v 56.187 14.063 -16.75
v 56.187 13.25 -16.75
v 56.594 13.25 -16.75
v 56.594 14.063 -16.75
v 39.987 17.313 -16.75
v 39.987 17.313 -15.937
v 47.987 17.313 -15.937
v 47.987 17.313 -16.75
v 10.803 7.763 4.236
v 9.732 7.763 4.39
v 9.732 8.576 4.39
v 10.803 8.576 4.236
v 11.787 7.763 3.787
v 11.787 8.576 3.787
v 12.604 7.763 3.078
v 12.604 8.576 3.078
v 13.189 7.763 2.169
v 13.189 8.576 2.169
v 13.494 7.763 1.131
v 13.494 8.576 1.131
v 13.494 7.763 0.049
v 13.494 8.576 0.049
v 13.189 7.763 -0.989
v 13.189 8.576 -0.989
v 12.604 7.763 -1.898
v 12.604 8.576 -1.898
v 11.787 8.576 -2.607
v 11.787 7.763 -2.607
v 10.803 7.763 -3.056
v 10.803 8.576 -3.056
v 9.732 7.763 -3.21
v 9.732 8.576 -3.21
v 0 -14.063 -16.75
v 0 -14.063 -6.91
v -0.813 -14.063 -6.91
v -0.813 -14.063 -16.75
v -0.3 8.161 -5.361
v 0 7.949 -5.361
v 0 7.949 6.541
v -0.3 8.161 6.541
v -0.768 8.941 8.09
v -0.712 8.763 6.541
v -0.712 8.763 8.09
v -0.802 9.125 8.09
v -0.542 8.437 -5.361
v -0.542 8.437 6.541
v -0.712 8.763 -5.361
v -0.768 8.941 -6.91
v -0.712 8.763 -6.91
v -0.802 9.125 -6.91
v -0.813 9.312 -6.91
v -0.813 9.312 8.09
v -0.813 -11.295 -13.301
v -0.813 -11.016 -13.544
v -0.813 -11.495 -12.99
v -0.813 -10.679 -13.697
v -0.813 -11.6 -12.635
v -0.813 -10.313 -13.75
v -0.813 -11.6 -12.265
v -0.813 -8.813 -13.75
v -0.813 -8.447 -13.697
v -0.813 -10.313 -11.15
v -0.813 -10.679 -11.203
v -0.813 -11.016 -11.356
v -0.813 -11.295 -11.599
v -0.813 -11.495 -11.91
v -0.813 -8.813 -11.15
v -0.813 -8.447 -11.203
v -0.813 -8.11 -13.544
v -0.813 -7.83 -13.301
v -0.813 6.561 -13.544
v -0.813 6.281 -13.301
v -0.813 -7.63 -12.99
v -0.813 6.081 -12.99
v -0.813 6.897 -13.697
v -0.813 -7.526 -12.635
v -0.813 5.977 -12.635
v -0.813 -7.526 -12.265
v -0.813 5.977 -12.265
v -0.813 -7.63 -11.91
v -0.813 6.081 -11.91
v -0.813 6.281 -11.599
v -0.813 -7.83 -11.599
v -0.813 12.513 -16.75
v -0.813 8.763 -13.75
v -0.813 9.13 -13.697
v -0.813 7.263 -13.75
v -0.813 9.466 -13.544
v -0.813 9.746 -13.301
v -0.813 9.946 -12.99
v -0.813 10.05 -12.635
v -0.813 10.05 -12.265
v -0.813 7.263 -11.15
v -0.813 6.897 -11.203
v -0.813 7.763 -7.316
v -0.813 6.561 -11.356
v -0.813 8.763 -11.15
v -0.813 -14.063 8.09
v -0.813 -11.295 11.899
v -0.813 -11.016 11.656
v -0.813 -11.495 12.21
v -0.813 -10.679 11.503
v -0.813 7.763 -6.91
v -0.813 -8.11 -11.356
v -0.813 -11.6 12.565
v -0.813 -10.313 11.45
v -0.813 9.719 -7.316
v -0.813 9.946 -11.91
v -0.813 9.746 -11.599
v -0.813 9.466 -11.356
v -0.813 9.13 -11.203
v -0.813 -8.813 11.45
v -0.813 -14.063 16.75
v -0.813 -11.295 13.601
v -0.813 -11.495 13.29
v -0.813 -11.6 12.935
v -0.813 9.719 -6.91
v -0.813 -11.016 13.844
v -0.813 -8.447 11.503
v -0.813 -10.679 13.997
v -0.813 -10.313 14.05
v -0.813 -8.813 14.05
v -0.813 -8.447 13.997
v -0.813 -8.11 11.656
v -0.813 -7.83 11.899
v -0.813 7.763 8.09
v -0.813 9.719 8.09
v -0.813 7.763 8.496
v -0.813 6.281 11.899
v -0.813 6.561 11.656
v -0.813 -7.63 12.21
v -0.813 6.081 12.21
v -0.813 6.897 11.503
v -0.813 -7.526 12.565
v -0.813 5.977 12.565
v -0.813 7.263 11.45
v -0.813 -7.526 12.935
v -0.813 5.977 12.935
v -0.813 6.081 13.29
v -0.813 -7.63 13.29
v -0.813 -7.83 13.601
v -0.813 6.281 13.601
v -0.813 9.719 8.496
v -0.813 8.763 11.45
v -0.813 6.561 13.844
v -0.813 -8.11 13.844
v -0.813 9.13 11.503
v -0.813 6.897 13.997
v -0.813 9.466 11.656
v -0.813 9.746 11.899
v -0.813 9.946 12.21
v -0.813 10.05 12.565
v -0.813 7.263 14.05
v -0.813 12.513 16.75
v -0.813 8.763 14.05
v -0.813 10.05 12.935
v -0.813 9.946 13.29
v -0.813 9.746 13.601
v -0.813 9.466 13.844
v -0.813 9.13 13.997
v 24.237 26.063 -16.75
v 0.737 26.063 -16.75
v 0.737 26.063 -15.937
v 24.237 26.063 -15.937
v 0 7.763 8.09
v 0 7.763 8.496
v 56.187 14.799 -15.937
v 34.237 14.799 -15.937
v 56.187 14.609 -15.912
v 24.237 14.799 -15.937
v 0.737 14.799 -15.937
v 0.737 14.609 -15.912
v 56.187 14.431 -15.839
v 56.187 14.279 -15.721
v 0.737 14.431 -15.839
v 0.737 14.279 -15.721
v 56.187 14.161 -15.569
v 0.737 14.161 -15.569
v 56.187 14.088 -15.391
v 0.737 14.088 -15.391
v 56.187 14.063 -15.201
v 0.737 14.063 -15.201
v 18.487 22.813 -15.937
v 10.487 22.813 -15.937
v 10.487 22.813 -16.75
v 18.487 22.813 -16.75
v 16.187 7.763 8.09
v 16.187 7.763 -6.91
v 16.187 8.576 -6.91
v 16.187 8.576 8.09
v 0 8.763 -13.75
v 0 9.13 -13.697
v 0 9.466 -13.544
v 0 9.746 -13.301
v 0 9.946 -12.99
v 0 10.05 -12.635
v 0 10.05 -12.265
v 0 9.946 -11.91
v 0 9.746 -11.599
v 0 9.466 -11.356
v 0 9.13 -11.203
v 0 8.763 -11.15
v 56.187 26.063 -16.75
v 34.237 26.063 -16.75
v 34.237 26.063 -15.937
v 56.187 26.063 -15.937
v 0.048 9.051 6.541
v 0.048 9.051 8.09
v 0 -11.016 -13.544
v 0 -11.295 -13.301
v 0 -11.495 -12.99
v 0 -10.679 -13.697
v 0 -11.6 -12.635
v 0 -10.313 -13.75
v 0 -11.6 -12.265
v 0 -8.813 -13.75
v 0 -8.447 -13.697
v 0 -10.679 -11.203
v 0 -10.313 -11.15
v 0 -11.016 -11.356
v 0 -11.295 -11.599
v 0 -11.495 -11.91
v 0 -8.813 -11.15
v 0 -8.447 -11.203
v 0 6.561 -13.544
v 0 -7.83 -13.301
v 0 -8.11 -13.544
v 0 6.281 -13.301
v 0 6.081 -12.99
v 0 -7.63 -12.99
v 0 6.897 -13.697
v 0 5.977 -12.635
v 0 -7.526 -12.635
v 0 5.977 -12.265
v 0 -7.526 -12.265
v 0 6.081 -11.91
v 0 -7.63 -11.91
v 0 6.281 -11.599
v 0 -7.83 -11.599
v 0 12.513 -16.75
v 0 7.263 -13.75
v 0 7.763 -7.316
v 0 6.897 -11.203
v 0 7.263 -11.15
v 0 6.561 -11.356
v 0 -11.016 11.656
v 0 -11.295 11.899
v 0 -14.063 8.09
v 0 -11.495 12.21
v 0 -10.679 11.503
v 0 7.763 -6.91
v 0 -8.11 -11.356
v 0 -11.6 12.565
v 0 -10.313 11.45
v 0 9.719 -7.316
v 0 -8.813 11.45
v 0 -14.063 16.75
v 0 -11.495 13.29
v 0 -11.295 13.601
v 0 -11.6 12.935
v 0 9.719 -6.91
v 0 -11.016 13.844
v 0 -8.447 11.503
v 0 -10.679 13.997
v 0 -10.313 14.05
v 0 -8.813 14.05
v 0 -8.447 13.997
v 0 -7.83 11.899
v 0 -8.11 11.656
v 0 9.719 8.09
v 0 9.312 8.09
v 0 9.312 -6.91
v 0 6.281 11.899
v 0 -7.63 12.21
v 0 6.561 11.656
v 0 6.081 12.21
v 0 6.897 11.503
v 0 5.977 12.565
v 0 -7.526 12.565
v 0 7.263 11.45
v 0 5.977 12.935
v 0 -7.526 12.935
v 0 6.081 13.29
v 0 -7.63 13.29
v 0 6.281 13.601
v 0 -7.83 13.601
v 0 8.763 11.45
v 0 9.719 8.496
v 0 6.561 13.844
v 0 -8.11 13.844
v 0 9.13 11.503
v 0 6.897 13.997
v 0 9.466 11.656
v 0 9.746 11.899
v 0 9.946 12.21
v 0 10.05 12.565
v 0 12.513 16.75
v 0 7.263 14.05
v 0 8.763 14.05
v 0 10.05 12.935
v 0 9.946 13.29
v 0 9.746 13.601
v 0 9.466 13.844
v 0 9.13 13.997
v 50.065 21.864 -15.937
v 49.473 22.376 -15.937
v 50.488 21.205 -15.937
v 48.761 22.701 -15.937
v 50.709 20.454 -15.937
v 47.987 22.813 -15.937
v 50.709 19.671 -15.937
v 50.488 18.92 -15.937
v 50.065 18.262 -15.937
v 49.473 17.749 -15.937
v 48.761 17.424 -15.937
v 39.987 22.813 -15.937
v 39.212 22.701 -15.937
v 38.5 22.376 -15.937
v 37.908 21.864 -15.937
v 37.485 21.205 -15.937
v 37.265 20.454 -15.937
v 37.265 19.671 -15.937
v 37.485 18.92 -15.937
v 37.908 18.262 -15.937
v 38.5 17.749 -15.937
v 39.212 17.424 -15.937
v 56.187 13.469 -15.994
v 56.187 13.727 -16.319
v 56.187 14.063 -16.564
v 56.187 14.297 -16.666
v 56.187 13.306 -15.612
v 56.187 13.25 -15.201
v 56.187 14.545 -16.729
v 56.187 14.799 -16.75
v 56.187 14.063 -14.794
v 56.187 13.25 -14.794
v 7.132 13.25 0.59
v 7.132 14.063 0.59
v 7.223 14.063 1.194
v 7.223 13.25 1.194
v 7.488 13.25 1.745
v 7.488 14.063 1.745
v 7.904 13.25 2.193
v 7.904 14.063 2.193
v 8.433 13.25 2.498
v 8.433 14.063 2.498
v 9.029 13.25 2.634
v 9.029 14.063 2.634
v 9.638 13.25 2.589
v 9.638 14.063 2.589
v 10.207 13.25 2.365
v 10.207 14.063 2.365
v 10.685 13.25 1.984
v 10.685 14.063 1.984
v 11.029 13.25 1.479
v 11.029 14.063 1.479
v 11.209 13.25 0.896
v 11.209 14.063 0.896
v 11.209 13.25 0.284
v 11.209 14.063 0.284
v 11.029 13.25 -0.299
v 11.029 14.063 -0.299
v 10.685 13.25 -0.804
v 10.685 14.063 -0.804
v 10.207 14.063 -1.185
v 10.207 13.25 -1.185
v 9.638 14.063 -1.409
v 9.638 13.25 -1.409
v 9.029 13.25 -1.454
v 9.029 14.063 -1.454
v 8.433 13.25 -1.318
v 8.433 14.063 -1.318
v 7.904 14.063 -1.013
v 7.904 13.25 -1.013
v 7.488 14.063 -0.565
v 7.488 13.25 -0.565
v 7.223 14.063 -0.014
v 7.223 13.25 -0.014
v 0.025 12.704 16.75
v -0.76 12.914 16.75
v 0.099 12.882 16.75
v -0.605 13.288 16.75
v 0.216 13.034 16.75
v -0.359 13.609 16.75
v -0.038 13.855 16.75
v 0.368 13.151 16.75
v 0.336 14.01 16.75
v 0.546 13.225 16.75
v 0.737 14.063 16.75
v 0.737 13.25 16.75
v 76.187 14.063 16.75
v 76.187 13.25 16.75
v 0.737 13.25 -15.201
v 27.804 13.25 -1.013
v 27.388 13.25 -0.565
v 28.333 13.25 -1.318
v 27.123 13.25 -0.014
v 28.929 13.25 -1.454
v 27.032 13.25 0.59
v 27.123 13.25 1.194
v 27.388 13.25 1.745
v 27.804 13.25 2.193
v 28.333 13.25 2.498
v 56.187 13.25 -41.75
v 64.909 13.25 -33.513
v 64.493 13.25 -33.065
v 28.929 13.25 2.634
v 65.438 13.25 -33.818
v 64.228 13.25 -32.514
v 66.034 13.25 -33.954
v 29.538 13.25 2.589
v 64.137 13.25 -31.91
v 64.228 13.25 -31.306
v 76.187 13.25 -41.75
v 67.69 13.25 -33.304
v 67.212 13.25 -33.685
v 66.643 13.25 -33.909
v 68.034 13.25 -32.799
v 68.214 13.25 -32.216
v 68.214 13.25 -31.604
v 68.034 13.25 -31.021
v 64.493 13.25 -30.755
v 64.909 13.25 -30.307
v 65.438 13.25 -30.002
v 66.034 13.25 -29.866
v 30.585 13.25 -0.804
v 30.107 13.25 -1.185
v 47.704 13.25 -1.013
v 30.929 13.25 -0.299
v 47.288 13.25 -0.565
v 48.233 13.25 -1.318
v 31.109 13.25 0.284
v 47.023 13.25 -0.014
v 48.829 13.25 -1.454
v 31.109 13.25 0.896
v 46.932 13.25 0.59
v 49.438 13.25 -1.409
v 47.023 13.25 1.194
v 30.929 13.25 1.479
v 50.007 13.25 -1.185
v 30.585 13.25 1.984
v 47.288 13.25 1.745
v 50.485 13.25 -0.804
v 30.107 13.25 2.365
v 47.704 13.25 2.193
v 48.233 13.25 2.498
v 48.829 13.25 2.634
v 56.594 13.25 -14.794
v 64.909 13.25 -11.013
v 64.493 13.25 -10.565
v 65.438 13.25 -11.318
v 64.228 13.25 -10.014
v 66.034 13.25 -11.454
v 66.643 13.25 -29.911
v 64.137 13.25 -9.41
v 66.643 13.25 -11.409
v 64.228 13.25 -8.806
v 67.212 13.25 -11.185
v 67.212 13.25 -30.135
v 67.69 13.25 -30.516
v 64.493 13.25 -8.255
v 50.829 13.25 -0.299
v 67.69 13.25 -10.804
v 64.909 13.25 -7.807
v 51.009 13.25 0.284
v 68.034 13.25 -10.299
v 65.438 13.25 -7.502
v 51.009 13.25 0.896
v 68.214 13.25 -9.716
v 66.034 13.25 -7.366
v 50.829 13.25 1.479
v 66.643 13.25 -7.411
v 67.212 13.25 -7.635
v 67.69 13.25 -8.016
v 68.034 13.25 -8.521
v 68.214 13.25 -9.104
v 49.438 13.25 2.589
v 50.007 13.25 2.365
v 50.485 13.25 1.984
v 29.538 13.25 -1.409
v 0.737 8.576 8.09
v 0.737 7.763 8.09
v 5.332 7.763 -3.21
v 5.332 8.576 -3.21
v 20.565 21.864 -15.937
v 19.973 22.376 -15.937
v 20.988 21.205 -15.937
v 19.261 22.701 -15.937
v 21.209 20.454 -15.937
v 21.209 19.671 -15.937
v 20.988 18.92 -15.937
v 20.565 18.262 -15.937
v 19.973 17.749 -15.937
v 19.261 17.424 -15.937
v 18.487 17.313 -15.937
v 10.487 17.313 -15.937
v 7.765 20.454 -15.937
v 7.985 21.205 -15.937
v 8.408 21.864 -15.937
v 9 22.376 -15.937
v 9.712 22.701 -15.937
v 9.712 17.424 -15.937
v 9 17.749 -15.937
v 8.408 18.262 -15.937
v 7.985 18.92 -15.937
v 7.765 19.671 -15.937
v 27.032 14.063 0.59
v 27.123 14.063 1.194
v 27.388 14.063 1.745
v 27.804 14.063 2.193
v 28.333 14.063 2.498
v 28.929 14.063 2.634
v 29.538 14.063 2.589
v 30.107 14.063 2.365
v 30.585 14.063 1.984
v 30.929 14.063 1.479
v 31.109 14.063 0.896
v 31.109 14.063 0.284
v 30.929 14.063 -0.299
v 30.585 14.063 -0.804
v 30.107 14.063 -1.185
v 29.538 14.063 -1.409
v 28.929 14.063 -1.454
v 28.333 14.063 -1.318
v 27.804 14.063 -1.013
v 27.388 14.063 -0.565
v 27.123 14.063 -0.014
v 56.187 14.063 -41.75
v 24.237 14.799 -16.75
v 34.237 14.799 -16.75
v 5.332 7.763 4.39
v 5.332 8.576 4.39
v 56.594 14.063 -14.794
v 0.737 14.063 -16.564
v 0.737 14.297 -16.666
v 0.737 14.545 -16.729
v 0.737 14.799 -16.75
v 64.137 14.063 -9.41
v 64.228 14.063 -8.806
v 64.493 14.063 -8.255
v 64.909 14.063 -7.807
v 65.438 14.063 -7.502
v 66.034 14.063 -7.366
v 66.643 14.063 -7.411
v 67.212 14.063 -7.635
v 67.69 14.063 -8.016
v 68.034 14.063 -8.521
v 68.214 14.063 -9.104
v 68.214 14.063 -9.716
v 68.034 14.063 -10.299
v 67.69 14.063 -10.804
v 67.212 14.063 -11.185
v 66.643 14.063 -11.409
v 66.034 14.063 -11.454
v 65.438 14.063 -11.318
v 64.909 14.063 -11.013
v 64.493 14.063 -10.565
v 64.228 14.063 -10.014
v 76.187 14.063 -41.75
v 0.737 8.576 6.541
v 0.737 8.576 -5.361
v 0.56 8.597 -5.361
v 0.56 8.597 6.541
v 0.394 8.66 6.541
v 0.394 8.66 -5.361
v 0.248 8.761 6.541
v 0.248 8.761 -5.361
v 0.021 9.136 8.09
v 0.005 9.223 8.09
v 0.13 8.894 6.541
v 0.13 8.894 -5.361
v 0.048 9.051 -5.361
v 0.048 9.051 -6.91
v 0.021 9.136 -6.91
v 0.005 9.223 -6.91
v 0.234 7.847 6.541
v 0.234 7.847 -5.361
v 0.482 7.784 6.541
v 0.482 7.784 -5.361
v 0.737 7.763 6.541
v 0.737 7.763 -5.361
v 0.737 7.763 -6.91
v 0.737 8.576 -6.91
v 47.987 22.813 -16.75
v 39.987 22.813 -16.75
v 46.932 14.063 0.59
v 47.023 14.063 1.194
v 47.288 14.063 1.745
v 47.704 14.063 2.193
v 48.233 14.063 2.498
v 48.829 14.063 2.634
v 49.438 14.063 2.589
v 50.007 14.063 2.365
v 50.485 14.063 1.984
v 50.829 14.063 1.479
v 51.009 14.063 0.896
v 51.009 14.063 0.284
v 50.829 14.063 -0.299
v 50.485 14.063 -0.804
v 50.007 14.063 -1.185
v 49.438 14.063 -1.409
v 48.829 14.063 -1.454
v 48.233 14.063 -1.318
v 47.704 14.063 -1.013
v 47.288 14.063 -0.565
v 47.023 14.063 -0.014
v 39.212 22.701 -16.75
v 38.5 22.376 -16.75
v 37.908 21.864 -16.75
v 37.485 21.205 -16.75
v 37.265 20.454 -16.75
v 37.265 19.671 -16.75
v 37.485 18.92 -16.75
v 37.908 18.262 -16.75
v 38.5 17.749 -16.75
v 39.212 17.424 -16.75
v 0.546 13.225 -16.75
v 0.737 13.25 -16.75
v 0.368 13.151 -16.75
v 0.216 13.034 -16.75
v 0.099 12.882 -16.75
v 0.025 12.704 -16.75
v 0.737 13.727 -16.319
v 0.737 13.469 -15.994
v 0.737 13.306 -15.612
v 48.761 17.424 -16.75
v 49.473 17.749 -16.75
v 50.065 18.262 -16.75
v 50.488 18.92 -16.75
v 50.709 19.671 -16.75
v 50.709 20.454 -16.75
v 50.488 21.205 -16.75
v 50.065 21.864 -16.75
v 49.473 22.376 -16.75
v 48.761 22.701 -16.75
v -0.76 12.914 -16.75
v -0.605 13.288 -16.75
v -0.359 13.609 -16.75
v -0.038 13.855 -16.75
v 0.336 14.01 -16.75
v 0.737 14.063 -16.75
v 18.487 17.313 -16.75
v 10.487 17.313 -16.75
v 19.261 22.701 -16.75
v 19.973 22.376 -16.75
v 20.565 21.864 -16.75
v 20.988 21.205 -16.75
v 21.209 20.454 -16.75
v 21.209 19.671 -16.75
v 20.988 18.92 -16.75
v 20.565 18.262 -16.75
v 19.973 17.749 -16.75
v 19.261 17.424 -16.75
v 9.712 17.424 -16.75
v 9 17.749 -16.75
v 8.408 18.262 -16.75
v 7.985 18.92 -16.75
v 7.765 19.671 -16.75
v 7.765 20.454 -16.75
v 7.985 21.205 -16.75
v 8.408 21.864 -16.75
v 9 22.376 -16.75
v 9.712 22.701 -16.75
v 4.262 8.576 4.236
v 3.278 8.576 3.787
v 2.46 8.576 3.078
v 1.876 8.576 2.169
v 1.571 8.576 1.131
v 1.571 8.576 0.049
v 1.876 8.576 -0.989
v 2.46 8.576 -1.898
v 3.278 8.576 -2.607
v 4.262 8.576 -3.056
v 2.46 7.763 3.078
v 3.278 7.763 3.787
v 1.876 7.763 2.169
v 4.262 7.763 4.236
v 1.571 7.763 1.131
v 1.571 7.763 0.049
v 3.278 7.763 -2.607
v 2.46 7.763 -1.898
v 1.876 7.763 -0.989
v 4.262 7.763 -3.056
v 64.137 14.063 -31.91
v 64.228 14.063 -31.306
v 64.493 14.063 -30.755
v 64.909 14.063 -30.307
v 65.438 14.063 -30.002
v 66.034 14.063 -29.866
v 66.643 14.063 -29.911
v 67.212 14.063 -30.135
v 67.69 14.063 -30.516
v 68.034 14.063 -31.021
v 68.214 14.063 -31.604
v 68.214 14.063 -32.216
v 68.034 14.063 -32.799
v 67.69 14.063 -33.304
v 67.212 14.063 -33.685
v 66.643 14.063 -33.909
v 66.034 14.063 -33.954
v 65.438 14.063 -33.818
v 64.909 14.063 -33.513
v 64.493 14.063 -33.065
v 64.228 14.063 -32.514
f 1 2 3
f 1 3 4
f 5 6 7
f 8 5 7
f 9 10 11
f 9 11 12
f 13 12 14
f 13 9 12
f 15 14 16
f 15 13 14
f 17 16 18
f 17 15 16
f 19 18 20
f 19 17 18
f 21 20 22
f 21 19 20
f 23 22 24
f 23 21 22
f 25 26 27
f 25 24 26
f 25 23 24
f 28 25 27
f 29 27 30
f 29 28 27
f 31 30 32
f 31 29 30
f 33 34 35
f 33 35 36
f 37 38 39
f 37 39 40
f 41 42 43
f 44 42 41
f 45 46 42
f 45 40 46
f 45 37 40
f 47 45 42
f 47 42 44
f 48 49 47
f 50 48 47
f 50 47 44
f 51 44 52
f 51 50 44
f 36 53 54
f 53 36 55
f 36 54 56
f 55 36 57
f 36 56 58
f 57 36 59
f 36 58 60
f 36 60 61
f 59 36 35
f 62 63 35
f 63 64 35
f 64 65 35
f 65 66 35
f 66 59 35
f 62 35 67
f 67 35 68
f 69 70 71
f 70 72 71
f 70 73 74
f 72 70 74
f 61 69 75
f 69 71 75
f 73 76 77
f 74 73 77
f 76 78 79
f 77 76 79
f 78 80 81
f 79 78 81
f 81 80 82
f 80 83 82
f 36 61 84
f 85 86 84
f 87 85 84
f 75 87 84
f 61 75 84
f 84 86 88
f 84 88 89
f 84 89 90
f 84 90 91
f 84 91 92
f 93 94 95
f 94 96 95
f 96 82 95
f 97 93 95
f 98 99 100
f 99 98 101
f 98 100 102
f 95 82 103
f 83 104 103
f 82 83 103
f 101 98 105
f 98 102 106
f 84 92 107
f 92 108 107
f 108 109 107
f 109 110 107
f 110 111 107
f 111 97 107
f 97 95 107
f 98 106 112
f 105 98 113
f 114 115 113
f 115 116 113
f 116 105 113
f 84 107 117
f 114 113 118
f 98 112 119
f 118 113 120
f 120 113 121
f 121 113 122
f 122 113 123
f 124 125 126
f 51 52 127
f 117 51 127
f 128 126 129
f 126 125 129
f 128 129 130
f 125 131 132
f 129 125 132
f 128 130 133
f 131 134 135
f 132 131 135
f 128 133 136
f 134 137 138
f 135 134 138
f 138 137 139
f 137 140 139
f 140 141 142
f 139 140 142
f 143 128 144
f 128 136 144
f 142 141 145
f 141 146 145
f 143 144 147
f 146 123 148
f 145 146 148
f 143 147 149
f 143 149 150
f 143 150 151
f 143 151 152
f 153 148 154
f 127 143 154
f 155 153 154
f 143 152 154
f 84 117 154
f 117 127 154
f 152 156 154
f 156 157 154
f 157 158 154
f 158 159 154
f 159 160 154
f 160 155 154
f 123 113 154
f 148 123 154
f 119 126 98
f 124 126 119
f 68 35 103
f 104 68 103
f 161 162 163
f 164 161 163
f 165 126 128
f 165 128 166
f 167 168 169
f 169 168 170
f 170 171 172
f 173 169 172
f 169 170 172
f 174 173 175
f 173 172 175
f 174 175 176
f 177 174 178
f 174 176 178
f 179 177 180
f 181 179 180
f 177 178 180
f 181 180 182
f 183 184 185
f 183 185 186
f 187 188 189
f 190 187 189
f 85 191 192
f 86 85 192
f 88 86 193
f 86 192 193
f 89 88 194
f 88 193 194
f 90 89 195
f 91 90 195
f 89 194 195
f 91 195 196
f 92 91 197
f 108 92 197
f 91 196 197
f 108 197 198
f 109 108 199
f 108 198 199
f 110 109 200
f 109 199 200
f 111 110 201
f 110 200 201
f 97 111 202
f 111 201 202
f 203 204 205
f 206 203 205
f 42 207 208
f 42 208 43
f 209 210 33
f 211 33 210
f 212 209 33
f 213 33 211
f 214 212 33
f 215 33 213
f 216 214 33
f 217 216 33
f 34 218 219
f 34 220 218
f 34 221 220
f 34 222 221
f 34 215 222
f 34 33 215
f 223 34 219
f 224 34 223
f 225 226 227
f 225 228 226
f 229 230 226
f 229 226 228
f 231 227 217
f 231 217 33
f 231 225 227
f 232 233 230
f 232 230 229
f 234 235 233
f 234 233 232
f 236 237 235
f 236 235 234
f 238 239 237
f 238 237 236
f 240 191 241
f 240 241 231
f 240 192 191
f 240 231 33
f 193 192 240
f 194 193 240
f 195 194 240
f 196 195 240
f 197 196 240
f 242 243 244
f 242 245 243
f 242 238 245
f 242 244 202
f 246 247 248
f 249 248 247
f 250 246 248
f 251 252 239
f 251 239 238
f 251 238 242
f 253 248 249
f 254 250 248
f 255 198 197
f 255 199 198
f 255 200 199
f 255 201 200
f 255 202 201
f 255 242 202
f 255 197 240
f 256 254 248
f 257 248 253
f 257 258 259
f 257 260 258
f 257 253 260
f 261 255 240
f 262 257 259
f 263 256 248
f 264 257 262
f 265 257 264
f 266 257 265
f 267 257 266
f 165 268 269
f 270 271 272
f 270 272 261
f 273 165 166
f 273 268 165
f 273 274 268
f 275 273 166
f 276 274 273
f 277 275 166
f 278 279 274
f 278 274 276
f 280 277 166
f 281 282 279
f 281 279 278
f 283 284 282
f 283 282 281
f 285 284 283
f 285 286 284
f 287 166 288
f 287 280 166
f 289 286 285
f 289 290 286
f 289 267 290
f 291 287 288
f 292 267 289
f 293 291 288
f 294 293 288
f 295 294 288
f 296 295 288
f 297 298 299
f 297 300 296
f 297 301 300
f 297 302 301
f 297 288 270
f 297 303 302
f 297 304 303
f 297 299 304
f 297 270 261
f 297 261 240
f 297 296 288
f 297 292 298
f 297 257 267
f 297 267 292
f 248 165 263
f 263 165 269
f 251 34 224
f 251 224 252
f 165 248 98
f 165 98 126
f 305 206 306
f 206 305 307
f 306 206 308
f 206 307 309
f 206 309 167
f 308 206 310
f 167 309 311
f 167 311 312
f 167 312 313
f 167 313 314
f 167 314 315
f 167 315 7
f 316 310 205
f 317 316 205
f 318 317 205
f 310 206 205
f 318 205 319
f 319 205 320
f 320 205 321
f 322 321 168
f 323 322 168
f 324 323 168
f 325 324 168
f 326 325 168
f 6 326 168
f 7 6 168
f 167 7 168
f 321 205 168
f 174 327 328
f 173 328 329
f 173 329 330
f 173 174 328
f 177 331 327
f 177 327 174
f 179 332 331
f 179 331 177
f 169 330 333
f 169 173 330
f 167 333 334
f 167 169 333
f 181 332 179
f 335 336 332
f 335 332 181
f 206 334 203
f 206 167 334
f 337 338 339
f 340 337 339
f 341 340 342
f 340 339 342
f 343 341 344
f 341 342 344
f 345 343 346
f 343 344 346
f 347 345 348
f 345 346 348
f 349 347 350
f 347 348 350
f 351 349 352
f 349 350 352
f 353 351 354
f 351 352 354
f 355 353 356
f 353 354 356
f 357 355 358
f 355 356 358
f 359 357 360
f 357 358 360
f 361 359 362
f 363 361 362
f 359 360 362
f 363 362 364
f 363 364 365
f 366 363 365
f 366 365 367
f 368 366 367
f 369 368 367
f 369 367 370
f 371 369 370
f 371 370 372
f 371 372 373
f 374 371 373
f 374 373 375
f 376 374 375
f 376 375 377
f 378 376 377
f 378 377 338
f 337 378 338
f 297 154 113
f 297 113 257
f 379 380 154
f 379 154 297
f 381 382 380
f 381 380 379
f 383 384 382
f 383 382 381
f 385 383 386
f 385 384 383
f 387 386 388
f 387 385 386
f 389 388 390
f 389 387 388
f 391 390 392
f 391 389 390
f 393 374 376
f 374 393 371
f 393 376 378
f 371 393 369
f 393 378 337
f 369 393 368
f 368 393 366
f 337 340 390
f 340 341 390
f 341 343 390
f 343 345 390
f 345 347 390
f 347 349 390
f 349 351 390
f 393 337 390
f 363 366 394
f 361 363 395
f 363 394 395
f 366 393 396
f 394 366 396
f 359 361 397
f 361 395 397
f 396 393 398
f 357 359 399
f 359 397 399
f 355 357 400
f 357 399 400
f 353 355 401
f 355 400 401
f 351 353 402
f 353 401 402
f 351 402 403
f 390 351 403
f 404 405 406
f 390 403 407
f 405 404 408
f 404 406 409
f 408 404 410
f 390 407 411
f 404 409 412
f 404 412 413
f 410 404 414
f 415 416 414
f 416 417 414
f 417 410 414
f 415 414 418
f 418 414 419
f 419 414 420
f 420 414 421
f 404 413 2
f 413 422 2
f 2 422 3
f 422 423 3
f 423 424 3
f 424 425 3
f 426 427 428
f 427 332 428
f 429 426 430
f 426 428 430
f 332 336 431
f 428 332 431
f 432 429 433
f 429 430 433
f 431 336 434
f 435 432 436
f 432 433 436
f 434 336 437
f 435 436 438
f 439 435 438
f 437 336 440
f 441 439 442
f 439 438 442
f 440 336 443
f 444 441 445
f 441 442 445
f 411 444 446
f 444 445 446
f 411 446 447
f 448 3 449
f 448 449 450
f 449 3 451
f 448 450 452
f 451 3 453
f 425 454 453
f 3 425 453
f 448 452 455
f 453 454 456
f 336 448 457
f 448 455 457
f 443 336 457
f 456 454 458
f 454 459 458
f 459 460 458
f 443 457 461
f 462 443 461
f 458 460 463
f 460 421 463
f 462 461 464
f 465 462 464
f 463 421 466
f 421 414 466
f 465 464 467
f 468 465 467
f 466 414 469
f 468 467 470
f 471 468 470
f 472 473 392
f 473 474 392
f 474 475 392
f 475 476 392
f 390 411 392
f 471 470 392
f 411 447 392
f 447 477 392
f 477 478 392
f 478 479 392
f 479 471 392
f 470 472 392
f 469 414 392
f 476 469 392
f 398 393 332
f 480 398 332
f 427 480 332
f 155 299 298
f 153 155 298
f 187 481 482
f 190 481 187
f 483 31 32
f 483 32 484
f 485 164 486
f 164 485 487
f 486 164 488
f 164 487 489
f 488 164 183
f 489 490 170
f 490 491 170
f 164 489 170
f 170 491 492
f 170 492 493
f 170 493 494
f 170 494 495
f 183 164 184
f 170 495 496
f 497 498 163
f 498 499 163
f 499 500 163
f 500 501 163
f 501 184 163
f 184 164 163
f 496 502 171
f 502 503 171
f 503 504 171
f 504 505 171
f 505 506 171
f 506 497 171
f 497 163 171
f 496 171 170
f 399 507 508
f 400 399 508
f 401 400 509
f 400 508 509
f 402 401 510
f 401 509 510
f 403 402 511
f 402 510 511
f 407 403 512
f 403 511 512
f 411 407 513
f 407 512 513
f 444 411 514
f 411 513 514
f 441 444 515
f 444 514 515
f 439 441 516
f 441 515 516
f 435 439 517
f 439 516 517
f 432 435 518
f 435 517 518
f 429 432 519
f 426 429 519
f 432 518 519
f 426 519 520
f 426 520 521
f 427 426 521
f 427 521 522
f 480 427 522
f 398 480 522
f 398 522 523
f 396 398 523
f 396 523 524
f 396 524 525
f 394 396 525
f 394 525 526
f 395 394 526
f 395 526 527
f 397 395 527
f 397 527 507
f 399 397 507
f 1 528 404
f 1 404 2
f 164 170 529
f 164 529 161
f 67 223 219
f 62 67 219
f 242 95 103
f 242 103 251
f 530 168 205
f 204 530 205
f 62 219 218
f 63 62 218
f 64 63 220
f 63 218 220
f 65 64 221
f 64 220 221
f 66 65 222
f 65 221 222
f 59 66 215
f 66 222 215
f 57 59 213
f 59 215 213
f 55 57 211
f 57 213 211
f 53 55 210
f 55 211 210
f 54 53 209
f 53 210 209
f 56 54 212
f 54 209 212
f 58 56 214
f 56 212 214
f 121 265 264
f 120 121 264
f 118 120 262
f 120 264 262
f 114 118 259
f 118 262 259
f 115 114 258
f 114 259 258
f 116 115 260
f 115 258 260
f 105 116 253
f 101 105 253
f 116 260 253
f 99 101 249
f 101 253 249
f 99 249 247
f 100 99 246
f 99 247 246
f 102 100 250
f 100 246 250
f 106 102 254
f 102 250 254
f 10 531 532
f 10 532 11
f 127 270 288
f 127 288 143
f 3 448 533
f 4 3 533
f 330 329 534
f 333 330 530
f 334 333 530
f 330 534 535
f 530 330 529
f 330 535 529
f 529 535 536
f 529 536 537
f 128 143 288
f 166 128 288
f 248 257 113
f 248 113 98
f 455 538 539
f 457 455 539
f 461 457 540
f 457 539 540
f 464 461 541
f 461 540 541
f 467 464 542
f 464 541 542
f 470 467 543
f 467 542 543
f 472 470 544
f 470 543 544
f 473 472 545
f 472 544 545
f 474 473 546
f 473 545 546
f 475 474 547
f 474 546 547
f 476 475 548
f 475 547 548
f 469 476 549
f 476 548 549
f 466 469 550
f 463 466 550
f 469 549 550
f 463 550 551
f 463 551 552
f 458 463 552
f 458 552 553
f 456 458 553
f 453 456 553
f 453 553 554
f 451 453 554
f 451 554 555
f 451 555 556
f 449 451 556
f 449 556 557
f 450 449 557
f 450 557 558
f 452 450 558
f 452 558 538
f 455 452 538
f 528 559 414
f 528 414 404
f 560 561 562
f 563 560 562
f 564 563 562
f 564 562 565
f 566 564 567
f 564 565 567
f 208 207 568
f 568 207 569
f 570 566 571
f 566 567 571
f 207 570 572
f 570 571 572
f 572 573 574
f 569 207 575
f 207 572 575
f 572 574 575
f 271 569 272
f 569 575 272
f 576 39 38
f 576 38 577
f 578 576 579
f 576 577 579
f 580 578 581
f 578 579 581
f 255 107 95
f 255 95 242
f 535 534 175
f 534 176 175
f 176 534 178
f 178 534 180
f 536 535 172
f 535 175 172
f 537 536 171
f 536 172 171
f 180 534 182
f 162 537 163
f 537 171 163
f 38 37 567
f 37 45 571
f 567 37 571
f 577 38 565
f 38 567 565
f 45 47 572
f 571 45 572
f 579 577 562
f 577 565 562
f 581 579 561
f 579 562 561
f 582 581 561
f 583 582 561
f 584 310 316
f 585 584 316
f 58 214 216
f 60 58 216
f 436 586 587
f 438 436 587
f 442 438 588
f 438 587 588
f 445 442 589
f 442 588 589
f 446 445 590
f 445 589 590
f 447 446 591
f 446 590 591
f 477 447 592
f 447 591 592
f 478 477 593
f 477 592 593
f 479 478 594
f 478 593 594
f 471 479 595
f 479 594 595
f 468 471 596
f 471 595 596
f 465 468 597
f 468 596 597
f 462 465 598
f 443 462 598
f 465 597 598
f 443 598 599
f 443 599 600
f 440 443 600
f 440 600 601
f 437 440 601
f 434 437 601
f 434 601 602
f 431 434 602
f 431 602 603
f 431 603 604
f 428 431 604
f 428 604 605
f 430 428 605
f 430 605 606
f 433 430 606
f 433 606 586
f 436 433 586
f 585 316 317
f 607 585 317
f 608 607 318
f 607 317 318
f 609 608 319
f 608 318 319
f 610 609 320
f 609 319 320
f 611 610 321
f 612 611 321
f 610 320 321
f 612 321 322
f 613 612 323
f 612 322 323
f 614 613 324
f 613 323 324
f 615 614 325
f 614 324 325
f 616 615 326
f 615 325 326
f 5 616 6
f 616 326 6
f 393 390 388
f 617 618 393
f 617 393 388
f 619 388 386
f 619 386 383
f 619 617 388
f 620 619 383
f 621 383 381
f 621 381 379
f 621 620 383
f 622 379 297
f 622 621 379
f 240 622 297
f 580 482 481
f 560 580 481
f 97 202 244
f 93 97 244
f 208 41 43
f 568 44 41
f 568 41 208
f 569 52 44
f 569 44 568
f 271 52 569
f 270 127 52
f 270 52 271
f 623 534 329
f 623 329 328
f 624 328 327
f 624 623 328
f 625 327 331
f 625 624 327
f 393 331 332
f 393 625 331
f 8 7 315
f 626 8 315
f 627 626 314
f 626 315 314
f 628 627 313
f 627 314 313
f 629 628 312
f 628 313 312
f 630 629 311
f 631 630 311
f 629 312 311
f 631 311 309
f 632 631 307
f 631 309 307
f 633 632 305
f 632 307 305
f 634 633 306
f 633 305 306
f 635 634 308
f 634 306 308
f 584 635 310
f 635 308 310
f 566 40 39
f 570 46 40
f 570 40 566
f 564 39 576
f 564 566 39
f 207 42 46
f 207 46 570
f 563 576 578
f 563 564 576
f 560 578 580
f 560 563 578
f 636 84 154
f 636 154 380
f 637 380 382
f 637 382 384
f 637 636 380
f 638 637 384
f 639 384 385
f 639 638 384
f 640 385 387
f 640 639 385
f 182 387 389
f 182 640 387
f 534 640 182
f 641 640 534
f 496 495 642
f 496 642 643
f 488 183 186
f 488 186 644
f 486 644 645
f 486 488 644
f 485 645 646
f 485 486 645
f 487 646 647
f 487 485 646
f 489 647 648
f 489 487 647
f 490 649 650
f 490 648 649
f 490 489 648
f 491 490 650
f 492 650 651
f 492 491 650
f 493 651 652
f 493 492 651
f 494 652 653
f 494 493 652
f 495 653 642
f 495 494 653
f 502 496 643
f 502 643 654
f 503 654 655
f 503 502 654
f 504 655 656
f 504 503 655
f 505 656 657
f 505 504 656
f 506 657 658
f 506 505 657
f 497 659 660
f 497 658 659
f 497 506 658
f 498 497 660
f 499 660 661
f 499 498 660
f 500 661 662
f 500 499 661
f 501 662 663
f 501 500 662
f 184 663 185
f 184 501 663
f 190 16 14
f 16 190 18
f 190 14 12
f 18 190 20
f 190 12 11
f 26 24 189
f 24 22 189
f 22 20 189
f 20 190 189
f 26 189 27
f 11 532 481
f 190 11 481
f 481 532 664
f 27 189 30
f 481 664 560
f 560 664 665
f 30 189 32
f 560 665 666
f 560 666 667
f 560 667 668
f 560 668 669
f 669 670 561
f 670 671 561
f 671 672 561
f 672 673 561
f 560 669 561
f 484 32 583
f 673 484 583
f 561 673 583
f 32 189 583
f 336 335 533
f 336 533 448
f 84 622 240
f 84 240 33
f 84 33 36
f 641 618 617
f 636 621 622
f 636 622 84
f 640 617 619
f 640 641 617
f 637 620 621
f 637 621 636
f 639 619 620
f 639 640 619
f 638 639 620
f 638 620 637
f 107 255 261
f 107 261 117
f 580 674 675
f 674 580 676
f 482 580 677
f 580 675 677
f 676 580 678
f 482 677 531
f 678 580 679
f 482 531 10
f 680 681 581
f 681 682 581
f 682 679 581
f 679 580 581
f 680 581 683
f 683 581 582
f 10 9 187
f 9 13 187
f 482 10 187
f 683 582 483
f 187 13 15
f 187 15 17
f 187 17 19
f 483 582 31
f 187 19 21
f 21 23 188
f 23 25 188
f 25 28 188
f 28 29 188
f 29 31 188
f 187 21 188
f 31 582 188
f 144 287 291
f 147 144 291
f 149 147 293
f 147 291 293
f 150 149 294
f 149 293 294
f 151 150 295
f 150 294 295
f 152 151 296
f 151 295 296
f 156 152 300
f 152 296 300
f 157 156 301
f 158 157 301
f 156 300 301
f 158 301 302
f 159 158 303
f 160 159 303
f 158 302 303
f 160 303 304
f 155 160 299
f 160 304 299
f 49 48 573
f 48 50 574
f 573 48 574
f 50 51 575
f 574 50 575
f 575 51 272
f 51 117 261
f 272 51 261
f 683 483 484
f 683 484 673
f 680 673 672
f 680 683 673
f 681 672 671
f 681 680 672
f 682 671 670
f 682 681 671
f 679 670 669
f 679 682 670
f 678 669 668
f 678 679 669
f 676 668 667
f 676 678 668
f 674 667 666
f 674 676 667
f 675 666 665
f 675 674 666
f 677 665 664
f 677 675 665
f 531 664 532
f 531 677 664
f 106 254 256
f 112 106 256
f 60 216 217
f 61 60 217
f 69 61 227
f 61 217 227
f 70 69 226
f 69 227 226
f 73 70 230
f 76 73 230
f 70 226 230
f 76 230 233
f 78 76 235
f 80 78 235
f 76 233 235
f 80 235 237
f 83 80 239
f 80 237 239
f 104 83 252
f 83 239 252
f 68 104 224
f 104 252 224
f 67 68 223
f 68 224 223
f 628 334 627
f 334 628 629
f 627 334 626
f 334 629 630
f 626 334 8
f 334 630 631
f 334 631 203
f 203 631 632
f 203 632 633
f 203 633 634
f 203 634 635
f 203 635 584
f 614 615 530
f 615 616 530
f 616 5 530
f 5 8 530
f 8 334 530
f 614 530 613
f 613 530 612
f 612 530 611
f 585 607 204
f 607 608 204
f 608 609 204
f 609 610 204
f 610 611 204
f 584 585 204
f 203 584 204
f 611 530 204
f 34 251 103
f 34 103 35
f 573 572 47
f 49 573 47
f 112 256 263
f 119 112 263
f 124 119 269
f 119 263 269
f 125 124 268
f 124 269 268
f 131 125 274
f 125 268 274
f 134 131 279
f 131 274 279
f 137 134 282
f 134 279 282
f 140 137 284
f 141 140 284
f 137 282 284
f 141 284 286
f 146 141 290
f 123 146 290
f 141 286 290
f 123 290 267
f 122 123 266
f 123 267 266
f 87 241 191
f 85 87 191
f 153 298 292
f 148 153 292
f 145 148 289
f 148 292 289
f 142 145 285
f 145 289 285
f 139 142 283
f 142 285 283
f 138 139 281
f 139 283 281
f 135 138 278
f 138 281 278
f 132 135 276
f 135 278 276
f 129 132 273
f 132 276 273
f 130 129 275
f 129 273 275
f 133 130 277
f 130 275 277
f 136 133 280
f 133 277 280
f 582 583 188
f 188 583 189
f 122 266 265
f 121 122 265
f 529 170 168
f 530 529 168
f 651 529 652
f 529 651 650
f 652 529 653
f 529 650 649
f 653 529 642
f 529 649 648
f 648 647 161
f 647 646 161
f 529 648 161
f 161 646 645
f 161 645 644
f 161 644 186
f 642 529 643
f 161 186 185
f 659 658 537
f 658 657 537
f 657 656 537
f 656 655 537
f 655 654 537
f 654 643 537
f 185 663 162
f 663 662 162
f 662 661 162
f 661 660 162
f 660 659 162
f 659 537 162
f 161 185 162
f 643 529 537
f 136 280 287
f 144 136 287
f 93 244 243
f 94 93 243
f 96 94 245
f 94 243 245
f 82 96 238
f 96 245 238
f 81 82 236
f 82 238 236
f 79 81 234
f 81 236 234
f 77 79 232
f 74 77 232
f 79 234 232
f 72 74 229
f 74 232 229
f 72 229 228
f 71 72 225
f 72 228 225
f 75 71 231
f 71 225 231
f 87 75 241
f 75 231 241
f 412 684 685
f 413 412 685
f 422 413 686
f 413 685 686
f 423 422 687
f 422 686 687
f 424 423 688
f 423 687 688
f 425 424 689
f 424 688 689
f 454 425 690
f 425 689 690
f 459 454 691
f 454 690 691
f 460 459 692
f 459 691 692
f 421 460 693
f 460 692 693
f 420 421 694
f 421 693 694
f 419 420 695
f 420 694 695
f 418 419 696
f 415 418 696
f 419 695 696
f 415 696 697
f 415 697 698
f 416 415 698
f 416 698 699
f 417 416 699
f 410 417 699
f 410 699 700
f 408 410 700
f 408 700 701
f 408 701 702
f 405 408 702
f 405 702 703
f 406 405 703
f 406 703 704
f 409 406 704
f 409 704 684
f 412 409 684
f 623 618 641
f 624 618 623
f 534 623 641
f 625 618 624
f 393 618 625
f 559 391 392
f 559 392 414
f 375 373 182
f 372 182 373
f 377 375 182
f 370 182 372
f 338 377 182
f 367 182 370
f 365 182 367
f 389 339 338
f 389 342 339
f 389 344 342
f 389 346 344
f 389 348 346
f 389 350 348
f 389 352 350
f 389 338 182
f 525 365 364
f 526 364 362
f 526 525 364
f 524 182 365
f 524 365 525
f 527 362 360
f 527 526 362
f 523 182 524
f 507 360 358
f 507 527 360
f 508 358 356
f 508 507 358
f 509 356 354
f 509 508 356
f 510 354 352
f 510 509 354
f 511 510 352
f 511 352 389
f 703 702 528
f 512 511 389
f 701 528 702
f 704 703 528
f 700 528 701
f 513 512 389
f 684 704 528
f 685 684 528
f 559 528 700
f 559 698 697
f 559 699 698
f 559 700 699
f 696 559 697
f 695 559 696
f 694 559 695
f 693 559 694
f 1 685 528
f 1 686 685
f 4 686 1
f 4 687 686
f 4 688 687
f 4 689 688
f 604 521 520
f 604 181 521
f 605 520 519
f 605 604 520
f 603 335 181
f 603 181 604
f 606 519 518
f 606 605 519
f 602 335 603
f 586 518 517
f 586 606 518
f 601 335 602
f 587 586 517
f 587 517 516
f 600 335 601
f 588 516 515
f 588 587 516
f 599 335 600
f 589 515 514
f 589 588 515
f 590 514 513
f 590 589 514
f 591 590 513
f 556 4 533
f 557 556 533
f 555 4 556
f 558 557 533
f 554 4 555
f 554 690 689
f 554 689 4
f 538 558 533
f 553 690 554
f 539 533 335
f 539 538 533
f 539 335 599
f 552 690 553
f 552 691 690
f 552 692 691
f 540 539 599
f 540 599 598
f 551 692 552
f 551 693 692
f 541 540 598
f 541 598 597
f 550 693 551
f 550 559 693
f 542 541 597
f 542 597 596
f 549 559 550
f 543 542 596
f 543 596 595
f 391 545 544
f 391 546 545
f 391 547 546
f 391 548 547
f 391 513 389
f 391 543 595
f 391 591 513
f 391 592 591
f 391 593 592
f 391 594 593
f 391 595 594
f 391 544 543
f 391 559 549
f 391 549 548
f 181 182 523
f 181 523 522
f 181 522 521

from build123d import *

# Parameters (mm, degrees)
BASE_FLANGE2_DEPTH           = 0.8128
EDGE_FLANGE1_STRIP_W         = 4.7244
EDGE_FLANGE1_STRIP_H         = 0.8128
EDGE_FLANGE1_STRIP_CUT_DEPTH = 33.5
EDGE_FLANGE1_DEPTH           = 33.5
EDGE_FLANGE1_FLAT_DEPTH      = 0.8128
EDGE_FLANGE3_START           = 0.7366
EDGE_FLANGE3_DEPTH           = 55.857
EDGE_FLANGE3_START_2         = 56.1872
EDGE_FLANGE3_2_DEPTH         = 0.4064
EDGE_FLANGE3_3_DEPTH         = 55.4506
CUT_EXTRUDE1_REACH           = 93.316
SKETCH21_R                   = 2.05
CUT_EXTRUDE2_REACH           = 88.903
SKETCH22_W                   = 10
SKETCH22_H                   = 11.2634
EDGE_FLANGE4_START           = -7.3164
EDGE_FLANGE4_DEPTH           = 15.8128
EDGE_FLANGE4_2_DEPTH         = 0.4064
EDGE_FLANGE4_START_2         = 8.09
EDGE_FLANGE4_3_DEPTH         = 0.4064
EDGE_FLANGE4_START_3         = -6.91
EDGE_FLANGE4_4_DEPTH         = 15
CUT_EXTRUDE3_REACH           = 91.576
CUT_EXTRUDE4_REACH           = 92.702
CUT_EXTRUDE6_START           = 6.5406
CUT_EXTRUDE6_DEPTH           = 1.5494


# Read off the part's stored shape, not the designer's step: Edge-Flange3, Edge-Flange4, Cut-Extrude6
# Sheet-metal steps are written as plain solids
with BuildPart() as part:
    # Sketch7 → Base-Flange2 (new body)
    with BuildSketch(Plane.YZ):
        Polygon((-14.0628, 8.09), (7.7628, 8.09), (7.7628, -6.91), (-14.0628, -6.91), (-14.0628, -16.75), (14.0628, -16.75), (14.0628, 16.75), (-14.0628, 16.75), align=None)
    extrude(amount=-BASE_FLANGE2_DEPTH)

    # Edge-Flange1 strip (across the edge) → Edge-Flange1 strip cut (cut)
    with BuildSketch(Plane(origin=(0, 14.0628, -16.75), x_dir=(0, -1, 0), z_dir=(0, 0, 1))):
        with Locations((-0.8128, -0.4064)):
            Rectangle(EDGE_FLANGE1_STRIP_W, EDGE_FLANGE1_STRIP_H)
    extrude(amount=EDGE_FLANGE1_STRIP_CUT_DEPTH, mode=Mode.SUBTRACT)

    # Edge-Flange1 bend section (across the edge) → Edge-Flange1 (add)
    with BuildSketch(Plane(origin=(0, 14.0628, -16.75), x_dir=(0, -1, 0), z_dir=(0, 0, 1))):
        with BuildLine():
            Line((0, 0.7366), (0.8128, 0.7366))
            ThreePointArc((0.8128, 0.7366), (1.028545145, 0.215745145), (1.5494, 0))
            Line((1.5494, 0), (1.5494, -0.8128))
            ThreePointArc((1.5494, -0.8128), (0.453808753, -0.358991247), (0, 0.7366))
        make_face()
    extrude(amount=EDGE_FLANGE1_DEPTH)

    # Edge-Flange1 profile (on flange) → Edge-Flange1 flat (add)
    with BuildSketch(Plane.ZX.offset(14.0628)):
        Polygon((-41.75, 56.1872), (-16.75, 56.1872), (-16.75, 0.7366), (16.75, 0.7366), (16.75, 76.1872), (-41.75, 76.1872), align=None)
    extrude(amount=-EDGE_FLANGE1_FLAT_DEPTH)

    # Edge-Flange3 outline → Edge-Flange3 (cut)
    with BuildSketch(Plane.YZ.offset(EDGE_FLANGE3_START)):
        with BuildLine():
            Line((14.0628, -16.75), (14.0628, -16.563707039))
            ThreePointArc((14.0628, -16.563707039), (13.468624211, -15.994121367), (13.25, -15.2006))
            Line((13.25, -15.2006), (13.25, -16.75))
            Line((13.25, -16.75), (14.0628, -16.75))
        make_face()
    extrude(amount=EDGE_FLANGE3_DEPTH, mode=Mode.SUBTRACT)

    # Edge-Flange3 2 outline → Edge-Flange3 2 (cut)
    with BuildSketch(Plane.YZ.offset(EDGE_FLANGE3_START_2)):
        with BuildLine():
            ThreePointArc((13.25, -15.2006), (13.468624211, -15.994121367), (14.0628, -16.563707039))
            Line((14.0628, -16.563707039), (14.0628, -14.7942))
            Line((14.0628, -14.7942), (13.25, -14.7942))
            Line((13.25, -14.7942), (13.25, -15.2006))
        make_face()
    extrude(amount=EDGE_FLANGE3_2_DEPTH, mode=Mode.SUBTRACT)

    # Edge-Flange3 3 outline → Edge-Flange3 3 (add)
    with BuildSketch(Plane.YZ.offset(EDGE_FLANGE3_START)):
        with BuildLine():
            Line((14.7994, -16.75), (26.0628, -16.75))
            Line((26.0628, -16.75), (26.0628, -15.9372))
            Line((26.0628, -15.9372), (14.7994, -15.9372))
            ThreePointArc((14.7994, -15.9372), (14.278545145, -15.721454855), (14.0628, -15.2006))
            Line((14.0628, -15.2006), (14.0628, -16.563707039))
            ThreePointArc((14.0628, -16.563707039), (14.419503755, -16.702704924), (14.7994, -16.75))
        make_face()
    extrude(amount=EDGE_FLANGE3_3_DEPTH)

    # Sketch21 → Cut-Extrude1 (cut, up to next)
    with BuildSketch(Plane(origin=(0, 14.0628, 0), x_dir=(-1, 0, 0), z_dir=(0, 1, 0)), mode=Mode.PRIVATE) as cut_extrude1_sk1:
        with Locations((-66.1872, -31.91)):
            Circle(SKETCH21_R)
    cut_extrude1_tool1 = extrude(cut_extrude1_sk1.sketch, amount=-CUT_EXTRUDE1_REACH, mode=Mode.PRIVATE) & part.part
    # Sketch21 → Cut-Extrude1 (cut, up to next)
    with BuildSketch(Plane(origin=(0, 14.0628, 0), x_dir=(-1, 0, 0), z_dir=(0, 1, 0)), mode=Mode.PRIVATE) as cut_extrude1_sk2:
        with Locations((-66.1872, -9.41)):
            Circle(SKETCH21_R)
    cut_extrude1_tool2 = extrude(cut_extrude1_sk2.sketch, amount=-CUT_EXTRUDE1_REACH, mode=Mode.PRIVATE) & part.part
    # Sketch21 → Cut-Extrude1 (cut, up to next)
    with BuildSketch(Plane(origin=(0, 14.0628, 0), x_dir=(-1, 0, 0), z_dir=(0, 1, 0)), mode=Mode.PRIVATE) as cut_extrude1_sk3:
        with Locations((-48.982258849, 0.59)):
            Circle(SKETCH21_R)
    cut_extrude1_tool3 = extrude(cut_extrude1_sk3.sketch, amount=-CUT_EXTRUDE1_REACH, mode=Mode.PRIVATE) & part.part
    # Sketch21 → Cut-Extrude1 (cut, up to next)
    with BuildSketch(Plane(origin=(0, 14.0628, 0), x_dir=(-1, 0, 0), z_dir=(0, 1, 0)), mode=Mode.PRIVATE) as cut_extrude1_sk4:
        with Locations((-29.082258849, 0.59)):
            Circle(SKETCH21_R)
    cut_extrude1_tool4 = extrude(cut_extrude1_sk4.sketch, amount=-CUT_EXTRUDE1_REACH, mode=Mode.PRIVATE) & part.part
    # Sketch21 → Cut-Extrude1 (cut, up to next)
    with BuildSketch(Plane(origin=(0, 14.0628, 0), x_dir=(-1, 0, 0), z_dir=(0, 1, 0)), mode=Mode.PRIVATE) as cut_extrude1_sk5:
        with Locations((-9.182258849, 0.59)):
            Circle(SKETCH21_R)
    cut_extrude1_tool5 = extrude(cut_extrude1_sk5.sketch, amount=-CUT_EXTRUDE1_REACH, mode=Mode.PRIVATE) & part.part
    add(cut_extrude1_tool1.solids().sort_by_distance((66.1872, 14.0628, -31.91))[0], mode=Mode.SUBTRACT)
    add(cut_extrude1_tool2.solids().sort_by_distance((66.1872, 14.0628, -9.41))[0], mode=Mode.SUBTRACT)
    add(cut_extrude1_tool3.solids().sort_by_distance((48.982259, 14.0628, 0.59))[0], mode=Mode.SUBTRACT)
    add(cut_extrude1_tool4.solids().sort_by_distance((29.082259, 14.0628, 0.59))[0], mode=Mode.SUBTRACT)
    add(cut_extrude1_tool5.solids().sort_by_distance((9.182259, 14.0628, 0.59))[0], mode=Mode.SUBTRACT)

    # Sketch22 → Cut-Extrude2 (cut, up to next)
    with BuildSketch(Plane.XY.offset(-15.9372), mode=Mode.PRIVATE) as cut_extrude2_sk1:
        with BuildLine():
            Line((10.4866, 22.8128), (18.4866, 22.8128))
            ThreePointArc((18.4866, 22.8128), (21.2366, 20.0628), (18.4866, 17.3128))
            Line((18.4866, 17.3128), (10.4866, 17.3128))
            ThreePointArc((10.4866, 17.3128), (7.7366, 20.0628), (10.4866, 22.8128))
        make_face()
    cut_extrude2_tool1 = extrude(cut_extrude2_sk1.sketch, amount=-CUT_EXTRUDE2_REACH, mode=Mode.PRIVATE) & part.part
    # Sketch22 → Cut-Extrude2 (cut, up to next)
    with BuildSketch(Plane.XY.offset(-15.9372), mode=Mode.PRIVATE) as cut_extrude2_sk2:
        with BuildLine():
            Line((47.9866, 22.8128), (39.9866, 22.8128))
            ThreePointArc((39.9866, 22.8128), (37.2366, 20.0628), (39.9866, 17.3128))
            Line((39.9866, 17.3128), (47.9866, 17.3128))
            ThreePointArc((47.9866, 17.3128), (50.7366, 20.0628), (47.9866, 22.8128))
        make_face()
    cut_extrude2_tool2 = extrude(cut_extrude2_sk2.sketch, amount=-CUT_EXTRUDE2_REACH, mode=Mode.PRIVATE) & part.part
    # Sketch22 → Cut-Extrude2 (cut, up to next)
    with BuildSketch(Plane.XY.offset(-15.9372), mode=Mode.PRIVATE) as cut_extrude2_sk3:
        with Locations((29.2366, 20.4311)):
            Rectangle(SKETCH22_W, SKETCH22_H)
    cut_extrude2_tool3 = extrude(cut_extrude2_sk3.sketch, amount=-CUT_EXTRUDE2_REACH, mode=Mode.PRIVATE) & part.part
    add(cut_extrude2_tool1.solids().sort_by_distance((14.4866, 20.0628, -15.9372))[0], mode=Mode.SUBTRACT)
    add(cut_extrude2_tool2.solids().sort_by_distance((43.9866, 20.0628, -15.9372))[0], mode=Mode.SUBTRACT)
    add(cut_extrude2_tool3.solids().sort_by_distance((29.2366, 20.4311, -15.9372))[0], mode=Mode.SUBTRACT)

    # Edge-Flange4 outline → Edge-Flange4 (cut)
    with BuildSketch(Plane.XY.offset(EDGE_FLANGE4_START)):
        with BuildLine():
            ThreePointArc((0, 7.949092961), (-0.594175789, 8.518678633), (-0.8128, 9.3122))
            Line((-0.8128, 9.3122), (-0.8128, 7.7628))
            Line((-0.8128, 7.7628), (0, 7.7628))
            Line((0, 7.7628), (0, 7.949092961))
        make_face()
    extrude(amount=EDGE_FLANGE4_DEPTH, mode=Mode.SUBTRACT)

    # Edge-Flange4 2 outline → Edge-Flange4 2 (cut)
    with BuildSketch(Plane.XY.offset(EDGE_FLANGE4_START)):
        with BuildLine():
            Line((0, 9.7186), (-0.8128, 9.7186))
            Line((-0.8128, 9.7186), (-0.8128, 9.3122))
            ThreePointArc((-0.8128, 9.3122), (-0.594175789, 8.518678633), (0, 7.949092961))
            Line((0, 7.949092961), (0, 9.7186))
        make_face()
    extrude(amount=EDGE_FLANGE4_2_DEPTH, mode=Mode.SUBTRACT)

    # Edge-Flange4 3 outline → Edge-Flange4 3 (cut)
    with BuildSketch(Plane.XY.offset(EDGE_FLANGE4_START_2)):
        with BuildLine():
            Line((0, 9.7186), (-0.8128, 9.7186))
            Line((-0.8128, 9.7186), (-0.8128, 9.3122))
            ThreePointArc((-0.8128, 9.3122), (-0.594175789, 8.518678633), (0, 7.949092961))
            Line((0, 7.949092961), (0, 9.7186))
        make_face()
    extrude(amount=EDGE_FLANGE4_3_DEPTH, mode=Mode.SUBTRACT)

    # Edge-Flange4 4 outline → Edge-Flange4 4 (add)
    with BuildSketch(Plane.XY.offset(EDGE_FLANGE4_START_3)):
        with BuildLine():
            ThreePointArc((0.7366, 8.5756), (0.215745145, 8.791345145), (0, 9.3122))
            Line((0, 9.3122), (0, 7.949092961))
            ThreePointArc((0, 7.949092961), (0.356703755, 7.810095076), (0.7366, 7.7628))
            Line((0.7366, 7.7628), (16.1872, 7.7628))
            Line((16.1872, 7.7628), (16.1872, 8.5756))
            Line((16.1872, 8.5756), (0.7366, 8.5756))
        make_face()
    extrude(amount=EDGE_FLANGE4_4_DEPTH)

    # Sketch27 → Cut-Extrude3 (cut, up to next)
    with BuildSketch(Plane.XZ.offset(-7.7628), mode=Mode.PRIVATE) as cut_extrude3_sk1:
        with BuildLine():
            Line((9.732258849, -3.21), (5.332258849, -3.21))
            ThreePointArc((5.332258849, -3.21), (1.532258849, 0.59), (5.332258849, 4.39))
            Line((5.332258849, 4.39), (9.732258849, 4.39))
            ThreePointArc((9.732258849, 4.39), (13.532258849, 0.59), (9.732258849, -3.21))
        make_face()
    cut_extrude3_tool1 = extrude(cut_extrude3_sk1.sketch, amount=-CUT_EXTRUDE3_REACH, mode=Mode.PRIVATE) & part.part
    add(cut_extrude3_tool1.solids().sort_by_distance((7.532259, 7.7628, 0.59))[0], mode=Mode.SUBTRACT)

    # Sketch33 → Cut-Extrude4 (cut, up to next)
    with BuildSketch(Plane.YZ, mode=Mode.PRIVATE) as cut_extrude4_sk1:
        with BuildLine():
            Line((-10.3128, -13.75), (-8.8128, -13.75))
            ThreePointArc((-8.8128, -13.75), (-7.5128, -12.45), (-8.8128, -11.15))
            Line((-8.8128, -11.15), (-10.3128, -11.15))
            ThreePointArc((-10.3128, -11.15), (-11.6128, -12.45), (-10.3128, -13.75))
        make_face()
    cut_extrude4_tool1 = extrude(cut_extrude4_sk1.sketch, amount=-CUT_EXTRUDE4_REACH, mode=Mode.PRIVATE) & part.part
    # Sketch33 → Cut-Extrude4 (cut, up to next)
    with BuildSketch(Plane.YZ, mode=Mode.PRIVATE) as cut_extrude4_sk2:
        with BuildLine():
            Line((7.2634, -13.75), (8.7634, -13.75))
            ThreePointArc((8.7634, -13.75), (10.0634, -12.45), (8.7634, -11.15))
            Line((8.7634, -11.15), (7.2634, -11.15))
            ThreePointArc((7.2634, -11.15), (5.9634, -12.45), (7.2634, -13.75))
        make_face()
    cut_extrude4_tool2 = extrude(cut_extrude4_sk2.sketch, amount=-CUT_EXTRUDE4_REACH, mode=Mode.PRIVATE) & part.part
    # Sketch33 → Cut-Extrude4 (cut, up to next)
    with BuildSketch(Plane.YZ, mode=Mode.PRIVATE) as cut_extrude4_sk3:
        with BuildLine():
            Line((-10.3128, 11.45), (-8.8128, 11.45))
            ThreePointArc((-8.8128, 11.45), (-7.5128, 12.75), (-8.8128, 14.05))
            Line((-8.8128, 14.05), (-10.3128, 14.05))
            ThreePointArc((-10.3128, 14.05), (-11.6128, 12.75), (-10.3128, 11.45))
        make_face()
    cut_extrude4_tool3 = extrude(cut_extrude4_sk3.sketch, amount=-CUT_EXTRUDE4_REACH, mode=Mode.PRIVATE) & part.part
    # Sketch33 → Cut-Extrude4 (cut, up to next)
    with BuildSketch(Plane.YZ, mode=Mode.PRIVATE) as cut_extrude4_sk4:
        with BuildLine():
            Line((7.2634, 11.45), (8.7634, 11.45))
            ThreePointArc((8.7634, 11.45), (10.0634, 12.75), (8.7634, 14.05))
            Line((8.7634, 14.05), (7.2634, 14.05))
            ThreePointArc((7.2634, 14.05), (5.9634, 12.75), (7.2634, 11.45))
        make_face()
    cut_extrude4_tool4 = extrude(cut_extrude4_sk4.sketch, amount=-CUT_EXTRUDE4_REACH, mode=Mode.PRIVATE) & part.part
    add(cut_extrude4_tool1.solids().sort_by_distance((0, -9.5628, -12.45))[0], mode=Mode.SUBTRACT)
    add(cut_extrude4_tool2.solids().sort_by_distance((0, 8.0134, -12.45))[0], mode=Mode.SUBTRACT)
    add(cut_extrude4_tool3.solids().sort_by_distance((0, -9.5628, 12.75))[0], mode=Mode.SUBTRACT)
    add(cut_extrude4_tool4.solids().sort_by_distance((0, 8.0134, 12.75))[0], mode=Mode.SUBTRACT)

    # Cut-Extrude6 outline → Cut-Extrude6 (cut)
    with BuildSketch(Plane.XY.offset(CUT_EXTRUDE6_START)):
        with BuildLine():
            ThreePointArc((-0.712123576, 8.7628), (-0.143570438, 8.037076335), (0.7366, 7.7628))
            Line((0.7366, 7.7628), (0.7366, 8.5756))
            ThreePointArc((0.7366, 8.5756), (0.318158316, 8.705993668), (0.047862562, 9.051009836))
            Line((0.047862562, 9.051009836), (-0.712123576, 8.7628))
        make_face()
    cut_extrude6 = extrude(amount=CUT_EXTRUDE6_DEPTH, mode=Mode.SUBTRACT)

    # Mirror1: Cut-Extrude6 across plane
    add(cut_extrude6.mirror(Plane.XY.offset(0.59)), mode=Mode.SUBTRACT)


solid = part.part
